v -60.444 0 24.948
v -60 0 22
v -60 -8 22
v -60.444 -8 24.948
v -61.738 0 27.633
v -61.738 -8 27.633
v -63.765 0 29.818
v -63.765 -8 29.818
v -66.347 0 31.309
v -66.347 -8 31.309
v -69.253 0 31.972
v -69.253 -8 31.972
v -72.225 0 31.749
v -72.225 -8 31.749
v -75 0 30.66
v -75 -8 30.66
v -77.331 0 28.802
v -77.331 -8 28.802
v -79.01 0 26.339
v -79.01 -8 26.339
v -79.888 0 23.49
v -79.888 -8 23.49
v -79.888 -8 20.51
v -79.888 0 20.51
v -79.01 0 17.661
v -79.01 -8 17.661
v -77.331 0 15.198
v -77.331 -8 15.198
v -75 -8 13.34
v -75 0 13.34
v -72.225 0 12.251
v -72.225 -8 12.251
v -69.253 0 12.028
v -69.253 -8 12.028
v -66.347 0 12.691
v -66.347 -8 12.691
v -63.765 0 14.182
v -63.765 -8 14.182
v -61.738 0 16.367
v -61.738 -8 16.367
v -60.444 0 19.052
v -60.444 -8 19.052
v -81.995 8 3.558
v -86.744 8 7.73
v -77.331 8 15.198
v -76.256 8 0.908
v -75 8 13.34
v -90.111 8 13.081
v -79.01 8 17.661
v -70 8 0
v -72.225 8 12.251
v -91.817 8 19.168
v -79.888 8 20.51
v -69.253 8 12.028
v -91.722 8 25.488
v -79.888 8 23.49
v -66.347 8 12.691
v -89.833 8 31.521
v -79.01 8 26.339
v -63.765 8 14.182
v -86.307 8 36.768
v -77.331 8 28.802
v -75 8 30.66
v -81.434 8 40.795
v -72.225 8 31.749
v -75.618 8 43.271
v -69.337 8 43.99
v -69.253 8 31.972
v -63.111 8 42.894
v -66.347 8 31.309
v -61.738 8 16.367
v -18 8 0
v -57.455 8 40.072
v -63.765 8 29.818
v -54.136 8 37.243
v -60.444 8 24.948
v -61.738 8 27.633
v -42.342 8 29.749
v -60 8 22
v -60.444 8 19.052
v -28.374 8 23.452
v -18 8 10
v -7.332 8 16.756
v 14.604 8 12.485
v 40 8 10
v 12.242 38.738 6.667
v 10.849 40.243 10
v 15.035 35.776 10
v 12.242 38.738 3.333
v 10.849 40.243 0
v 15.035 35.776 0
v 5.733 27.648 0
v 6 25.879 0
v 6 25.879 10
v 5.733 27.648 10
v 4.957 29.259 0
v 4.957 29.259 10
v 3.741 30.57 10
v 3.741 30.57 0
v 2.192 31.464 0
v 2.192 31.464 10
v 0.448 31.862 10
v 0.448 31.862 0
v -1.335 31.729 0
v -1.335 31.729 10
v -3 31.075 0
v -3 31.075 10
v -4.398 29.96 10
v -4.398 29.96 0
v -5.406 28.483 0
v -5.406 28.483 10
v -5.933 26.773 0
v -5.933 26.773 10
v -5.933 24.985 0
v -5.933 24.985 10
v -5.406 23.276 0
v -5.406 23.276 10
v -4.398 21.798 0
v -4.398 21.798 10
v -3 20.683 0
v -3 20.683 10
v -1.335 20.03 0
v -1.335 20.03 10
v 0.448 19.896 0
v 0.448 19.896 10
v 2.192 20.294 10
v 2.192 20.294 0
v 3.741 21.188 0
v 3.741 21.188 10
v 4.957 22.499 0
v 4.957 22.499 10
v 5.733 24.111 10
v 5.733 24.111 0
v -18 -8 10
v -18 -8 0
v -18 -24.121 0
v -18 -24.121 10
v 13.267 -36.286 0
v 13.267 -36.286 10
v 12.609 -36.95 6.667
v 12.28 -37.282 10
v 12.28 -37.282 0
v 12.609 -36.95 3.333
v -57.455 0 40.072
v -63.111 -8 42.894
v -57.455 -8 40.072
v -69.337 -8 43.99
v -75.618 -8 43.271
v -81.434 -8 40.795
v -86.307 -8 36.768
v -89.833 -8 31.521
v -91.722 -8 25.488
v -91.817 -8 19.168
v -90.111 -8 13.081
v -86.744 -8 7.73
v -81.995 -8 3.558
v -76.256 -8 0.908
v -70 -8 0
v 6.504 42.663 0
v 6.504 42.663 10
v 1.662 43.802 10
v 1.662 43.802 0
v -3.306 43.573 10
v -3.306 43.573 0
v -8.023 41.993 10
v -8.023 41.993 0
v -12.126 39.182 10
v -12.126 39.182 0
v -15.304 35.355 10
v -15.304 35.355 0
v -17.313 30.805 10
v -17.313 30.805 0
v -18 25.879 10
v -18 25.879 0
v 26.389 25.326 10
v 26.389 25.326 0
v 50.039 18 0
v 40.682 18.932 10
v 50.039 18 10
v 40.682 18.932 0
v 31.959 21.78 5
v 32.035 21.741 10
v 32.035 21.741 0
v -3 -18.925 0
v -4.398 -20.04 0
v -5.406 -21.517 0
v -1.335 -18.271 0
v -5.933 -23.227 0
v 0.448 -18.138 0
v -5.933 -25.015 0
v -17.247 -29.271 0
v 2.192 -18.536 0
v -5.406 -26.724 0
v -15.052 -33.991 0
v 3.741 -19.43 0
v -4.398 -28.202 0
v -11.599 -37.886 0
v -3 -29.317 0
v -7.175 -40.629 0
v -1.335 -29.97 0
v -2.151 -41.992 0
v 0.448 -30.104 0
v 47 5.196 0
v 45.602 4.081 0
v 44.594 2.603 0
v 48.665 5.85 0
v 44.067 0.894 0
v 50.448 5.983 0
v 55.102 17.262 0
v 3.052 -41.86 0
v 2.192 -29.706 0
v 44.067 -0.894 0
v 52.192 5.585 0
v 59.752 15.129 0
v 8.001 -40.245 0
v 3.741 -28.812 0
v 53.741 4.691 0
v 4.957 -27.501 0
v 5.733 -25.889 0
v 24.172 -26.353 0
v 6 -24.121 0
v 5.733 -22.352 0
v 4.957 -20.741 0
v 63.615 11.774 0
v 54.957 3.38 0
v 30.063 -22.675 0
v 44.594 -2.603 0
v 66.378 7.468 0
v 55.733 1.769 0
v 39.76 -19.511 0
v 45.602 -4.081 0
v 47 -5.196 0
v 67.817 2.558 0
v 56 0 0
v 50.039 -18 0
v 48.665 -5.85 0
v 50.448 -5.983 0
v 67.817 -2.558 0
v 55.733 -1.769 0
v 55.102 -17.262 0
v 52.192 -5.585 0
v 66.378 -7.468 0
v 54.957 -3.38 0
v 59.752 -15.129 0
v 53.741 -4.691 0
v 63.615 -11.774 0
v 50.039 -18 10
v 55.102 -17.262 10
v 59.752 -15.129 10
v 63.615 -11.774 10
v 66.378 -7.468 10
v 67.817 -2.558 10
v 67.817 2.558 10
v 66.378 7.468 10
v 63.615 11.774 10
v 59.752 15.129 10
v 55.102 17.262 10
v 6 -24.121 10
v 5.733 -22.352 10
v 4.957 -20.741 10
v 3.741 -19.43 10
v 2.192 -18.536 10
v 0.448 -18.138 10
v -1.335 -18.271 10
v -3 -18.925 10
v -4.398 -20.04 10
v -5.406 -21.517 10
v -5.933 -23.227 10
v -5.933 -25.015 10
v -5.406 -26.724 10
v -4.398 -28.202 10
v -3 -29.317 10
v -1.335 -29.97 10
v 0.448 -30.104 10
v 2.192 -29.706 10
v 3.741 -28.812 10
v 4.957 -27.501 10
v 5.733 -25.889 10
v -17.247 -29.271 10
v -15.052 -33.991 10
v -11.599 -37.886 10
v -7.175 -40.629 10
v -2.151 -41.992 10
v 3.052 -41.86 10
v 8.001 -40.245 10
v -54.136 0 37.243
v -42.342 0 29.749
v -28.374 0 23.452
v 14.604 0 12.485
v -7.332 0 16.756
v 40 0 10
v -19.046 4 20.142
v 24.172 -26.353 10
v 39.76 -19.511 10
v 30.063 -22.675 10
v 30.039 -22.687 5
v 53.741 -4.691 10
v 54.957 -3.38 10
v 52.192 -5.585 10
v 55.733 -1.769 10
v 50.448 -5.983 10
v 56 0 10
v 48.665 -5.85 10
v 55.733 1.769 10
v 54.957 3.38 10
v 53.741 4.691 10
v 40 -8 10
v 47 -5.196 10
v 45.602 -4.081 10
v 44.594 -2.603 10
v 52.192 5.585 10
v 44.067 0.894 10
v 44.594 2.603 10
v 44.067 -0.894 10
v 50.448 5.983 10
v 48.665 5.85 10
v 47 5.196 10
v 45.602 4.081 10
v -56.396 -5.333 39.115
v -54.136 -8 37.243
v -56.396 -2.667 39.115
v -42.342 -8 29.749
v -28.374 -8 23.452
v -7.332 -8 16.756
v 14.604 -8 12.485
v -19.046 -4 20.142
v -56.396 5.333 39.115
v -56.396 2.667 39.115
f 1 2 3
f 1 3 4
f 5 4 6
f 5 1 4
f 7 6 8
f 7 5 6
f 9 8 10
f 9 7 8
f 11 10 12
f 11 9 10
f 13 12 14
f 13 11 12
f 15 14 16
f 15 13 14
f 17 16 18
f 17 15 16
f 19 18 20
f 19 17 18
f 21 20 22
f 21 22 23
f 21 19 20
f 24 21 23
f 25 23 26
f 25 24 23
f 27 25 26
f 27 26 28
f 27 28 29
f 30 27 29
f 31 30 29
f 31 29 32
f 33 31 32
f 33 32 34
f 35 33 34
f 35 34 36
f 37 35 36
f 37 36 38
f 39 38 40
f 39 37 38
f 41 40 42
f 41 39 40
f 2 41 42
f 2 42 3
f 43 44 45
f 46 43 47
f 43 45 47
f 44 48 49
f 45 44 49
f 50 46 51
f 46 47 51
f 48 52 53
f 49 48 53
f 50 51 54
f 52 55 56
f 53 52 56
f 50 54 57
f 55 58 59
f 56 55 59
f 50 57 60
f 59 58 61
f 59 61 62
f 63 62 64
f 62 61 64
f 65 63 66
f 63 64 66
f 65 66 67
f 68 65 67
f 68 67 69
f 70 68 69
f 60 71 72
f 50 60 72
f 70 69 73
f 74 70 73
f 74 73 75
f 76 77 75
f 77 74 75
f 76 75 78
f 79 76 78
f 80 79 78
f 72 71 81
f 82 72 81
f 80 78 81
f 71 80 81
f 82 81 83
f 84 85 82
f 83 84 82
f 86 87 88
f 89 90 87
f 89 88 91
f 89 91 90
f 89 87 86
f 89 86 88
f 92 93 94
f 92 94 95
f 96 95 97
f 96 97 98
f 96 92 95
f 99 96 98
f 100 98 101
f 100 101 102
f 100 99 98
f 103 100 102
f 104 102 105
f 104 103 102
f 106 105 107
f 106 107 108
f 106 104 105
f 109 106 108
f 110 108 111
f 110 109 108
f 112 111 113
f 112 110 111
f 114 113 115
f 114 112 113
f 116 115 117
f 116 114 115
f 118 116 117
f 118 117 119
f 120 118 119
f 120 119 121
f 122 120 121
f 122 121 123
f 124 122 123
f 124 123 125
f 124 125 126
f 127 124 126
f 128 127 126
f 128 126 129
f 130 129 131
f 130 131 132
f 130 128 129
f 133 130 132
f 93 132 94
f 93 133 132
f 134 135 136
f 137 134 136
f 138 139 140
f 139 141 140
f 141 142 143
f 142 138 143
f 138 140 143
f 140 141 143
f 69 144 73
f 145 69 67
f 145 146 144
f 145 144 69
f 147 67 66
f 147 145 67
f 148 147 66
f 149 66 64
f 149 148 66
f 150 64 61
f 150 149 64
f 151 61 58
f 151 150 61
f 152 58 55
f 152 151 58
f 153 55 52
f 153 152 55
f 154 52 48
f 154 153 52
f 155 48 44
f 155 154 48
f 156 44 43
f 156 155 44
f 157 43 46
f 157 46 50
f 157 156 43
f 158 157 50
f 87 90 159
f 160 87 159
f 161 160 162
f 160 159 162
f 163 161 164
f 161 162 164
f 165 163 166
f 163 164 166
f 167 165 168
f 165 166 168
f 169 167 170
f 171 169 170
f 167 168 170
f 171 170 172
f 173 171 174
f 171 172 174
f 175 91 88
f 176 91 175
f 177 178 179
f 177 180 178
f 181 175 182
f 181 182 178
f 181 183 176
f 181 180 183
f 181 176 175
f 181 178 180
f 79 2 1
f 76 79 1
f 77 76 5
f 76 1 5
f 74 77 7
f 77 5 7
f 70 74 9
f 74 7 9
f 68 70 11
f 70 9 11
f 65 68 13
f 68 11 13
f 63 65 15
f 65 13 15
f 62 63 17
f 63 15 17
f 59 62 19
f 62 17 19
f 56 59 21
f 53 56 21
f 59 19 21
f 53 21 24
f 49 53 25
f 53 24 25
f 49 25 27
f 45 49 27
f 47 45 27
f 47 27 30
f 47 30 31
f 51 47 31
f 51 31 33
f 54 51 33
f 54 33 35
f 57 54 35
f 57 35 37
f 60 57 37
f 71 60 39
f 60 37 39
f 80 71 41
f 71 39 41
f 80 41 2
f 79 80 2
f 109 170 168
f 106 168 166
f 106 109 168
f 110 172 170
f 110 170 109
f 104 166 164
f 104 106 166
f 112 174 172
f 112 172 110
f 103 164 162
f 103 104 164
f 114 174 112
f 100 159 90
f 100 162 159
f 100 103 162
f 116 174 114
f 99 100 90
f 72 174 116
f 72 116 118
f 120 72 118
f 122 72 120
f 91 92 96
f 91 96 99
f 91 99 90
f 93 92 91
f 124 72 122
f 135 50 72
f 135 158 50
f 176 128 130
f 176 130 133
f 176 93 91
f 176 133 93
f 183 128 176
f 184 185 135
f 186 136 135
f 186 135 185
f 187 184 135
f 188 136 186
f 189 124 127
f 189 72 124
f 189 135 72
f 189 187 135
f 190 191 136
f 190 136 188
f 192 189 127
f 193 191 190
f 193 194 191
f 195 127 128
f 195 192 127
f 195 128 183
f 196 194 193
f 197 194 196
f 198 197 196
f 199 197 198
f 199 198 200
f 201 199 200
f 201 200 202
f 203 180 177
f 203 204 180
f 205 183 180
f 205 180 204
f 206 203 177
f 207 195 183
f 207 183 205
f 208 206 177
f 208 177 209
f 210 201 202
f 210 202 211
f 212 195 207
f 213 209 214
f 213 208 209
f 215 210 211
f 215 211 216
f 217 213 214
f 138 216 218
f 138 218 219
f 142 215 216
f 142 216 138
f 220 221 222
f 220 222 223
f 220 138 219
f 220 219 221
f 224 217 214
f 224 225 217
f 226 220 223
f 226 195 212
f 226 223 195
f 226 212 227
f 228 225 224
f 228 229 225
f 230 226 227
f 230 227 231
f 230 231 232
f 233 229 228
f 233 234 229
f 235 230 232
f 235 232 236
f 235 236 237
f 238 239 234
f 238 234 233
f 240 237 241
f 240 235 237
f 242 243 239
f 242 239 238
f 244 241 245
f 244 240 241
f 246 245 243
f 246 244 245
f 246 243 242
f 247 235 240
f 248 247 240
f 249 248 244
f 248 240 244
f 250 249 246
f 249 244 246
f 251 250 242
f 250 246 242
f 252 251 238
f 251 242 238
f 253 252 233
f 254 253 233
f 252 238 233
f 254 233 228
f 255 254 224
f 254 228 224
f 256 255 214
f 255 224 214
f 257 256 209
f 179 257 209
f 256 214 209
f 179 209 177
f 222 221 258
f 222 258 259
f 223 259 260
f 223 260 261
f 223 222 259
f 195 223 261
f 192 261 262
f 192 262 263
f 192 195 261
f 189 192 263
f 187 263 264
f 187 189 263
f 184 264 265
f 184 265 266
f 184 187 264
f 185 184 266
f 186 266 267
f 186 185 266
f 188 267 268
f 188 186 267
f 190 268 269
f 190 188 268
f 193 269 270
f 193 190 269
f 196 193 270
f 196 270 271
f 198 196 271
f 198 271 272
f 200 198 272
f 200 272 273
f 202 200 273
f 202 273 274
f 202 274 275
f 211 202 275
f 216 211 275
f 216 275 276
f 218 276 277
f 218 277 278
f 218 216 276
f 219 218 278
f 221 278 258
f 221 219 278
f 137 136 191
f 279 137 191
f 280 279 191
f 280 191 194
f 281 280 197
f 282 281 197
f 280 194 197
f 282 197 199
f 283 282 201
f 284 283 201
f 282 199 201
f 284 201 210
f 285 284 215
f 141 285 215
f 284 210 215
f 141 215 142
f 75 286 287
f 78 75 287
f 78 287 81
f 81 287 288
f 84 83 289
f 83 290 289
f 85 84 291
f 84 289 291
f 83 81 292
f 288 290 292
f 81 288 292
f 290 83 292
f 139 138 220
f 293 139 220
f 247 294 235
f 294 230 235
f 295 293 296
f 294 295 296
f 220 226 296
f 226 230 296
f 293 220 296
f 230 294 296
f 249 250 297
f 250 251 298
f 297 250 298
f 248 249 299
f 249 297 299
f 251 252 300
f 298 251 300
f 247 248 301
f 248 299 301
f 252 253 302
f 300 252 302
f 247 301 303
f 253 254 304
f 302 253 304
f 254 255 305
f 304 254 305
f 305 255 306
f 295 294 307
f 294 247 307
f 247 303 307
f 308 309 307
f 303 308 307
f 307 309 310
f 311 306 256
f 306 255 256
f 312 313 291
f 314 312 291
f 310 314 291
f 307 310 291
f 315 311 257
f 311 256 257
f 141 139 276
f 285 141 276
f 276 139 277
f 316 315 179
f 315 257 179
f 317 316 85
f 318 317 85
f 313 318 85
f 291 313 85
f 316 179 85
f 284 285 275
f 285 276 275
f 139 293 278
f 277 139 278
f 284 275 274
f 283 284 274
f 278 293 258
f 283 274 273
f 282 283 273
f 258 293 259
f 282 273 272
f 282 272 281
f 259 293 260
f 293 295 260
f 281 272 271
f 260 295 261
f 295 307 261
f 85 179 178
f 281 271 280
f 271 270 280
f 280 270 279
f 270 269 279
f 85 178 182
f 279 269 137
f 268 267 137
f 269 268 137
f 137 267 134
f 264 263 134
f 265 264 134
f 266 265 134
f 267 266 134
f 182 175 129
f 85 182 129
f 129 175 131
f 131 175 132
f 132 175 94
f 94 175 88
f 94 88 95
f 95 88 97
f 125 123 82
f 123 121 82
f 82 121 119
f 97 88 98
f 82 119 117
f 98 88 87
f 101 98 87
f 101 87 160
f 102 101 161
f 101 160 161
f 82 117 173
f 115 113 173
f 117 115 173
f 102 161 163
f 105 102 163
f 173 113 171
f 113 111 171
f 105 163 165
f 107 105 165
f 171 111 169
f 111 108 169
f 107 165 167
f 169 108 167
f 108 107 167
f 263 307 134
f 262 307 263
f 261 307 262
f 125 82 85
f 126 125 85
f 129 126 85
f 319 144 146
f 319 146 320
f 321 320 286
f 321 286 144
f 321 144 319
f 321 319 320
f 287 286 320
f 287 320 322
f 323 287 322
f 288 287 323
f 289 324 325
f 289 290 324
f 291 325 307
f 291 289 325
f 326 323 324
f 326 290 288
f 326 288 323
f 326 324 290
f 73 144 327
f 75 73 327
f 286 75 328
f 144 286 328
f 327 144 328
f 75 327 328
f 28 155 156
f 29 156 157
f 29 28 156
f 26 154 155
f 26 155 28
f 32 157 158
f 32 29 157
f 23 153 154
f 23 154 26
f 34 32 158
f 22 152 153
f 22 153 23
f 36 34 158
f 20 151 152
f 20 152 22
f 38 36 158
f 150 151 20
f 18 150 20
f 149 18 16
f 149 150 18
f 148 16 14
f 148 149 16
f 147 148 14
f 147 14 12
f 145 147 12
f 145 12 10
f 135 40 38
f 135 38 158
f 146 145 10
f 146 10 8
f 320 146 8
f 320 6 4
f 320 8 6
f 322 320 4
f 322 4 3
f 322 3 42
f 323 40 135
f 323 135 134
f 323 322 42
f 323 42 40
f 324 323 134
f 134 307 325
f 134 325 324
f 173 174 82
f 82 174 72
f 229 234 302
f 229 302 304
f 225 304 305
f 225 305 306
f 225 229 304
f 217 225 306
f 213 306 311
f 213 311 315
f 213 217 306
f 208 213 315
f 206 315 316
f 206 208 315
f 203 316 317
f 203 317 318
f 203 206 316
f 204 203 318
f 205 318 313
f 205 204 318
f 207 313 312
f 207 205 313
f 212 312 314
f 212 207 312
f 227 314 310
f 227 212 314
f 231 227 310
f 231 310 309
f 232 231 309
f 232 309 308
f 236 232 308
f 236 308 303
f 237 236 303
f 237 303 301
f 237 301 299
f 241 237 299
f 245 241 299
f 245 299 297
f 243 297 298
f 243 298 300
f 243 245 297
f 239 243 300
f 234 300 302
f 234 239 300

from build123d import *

# Parameters (mm, degrees)
F0_R          = 6
F1_DEPTH      = 10
F2_R          = 10
F3_DEPTH      = 8
F3_DEPTH_BACK = 8


with BuildPart() as f1:
    # F0 (on Top) → F1 (new body)
    with BuildSketch(Plane.XY):
        with BuildLine():
            add(Edge.make_bspline(
                [(15.035214282, 35.7758070535), (20.6547243447, 29.9096895942), (32.0572190076, 19.3354156229), (43.3709472389, 18.3830413599), (50.0389123718, 17.9999579396)],
                knots=[0.1100015048, 0.1100015048, 0.1100015048, 0.1100015048, 0.5520103315, 1, 1, 1, 1], degree=3))
            add(Edge.make_bspline(
                [(10.8487541415, 40.2425303512), (12.240880162, 38.7336352898), (13.6367024745, 37.2356913565), (15.035214282, 35.7758070535)],
                knots=[0, 0, 0, 0, 0.1100015048, 0.1100015048, 0.1100015048, 0.1100015048], degree=3))
            ThreePointArc((10.8487541415, 40.2425303512), (-8.0225440308, 41.9925361174), (-18, 25.8792252449))
            Line((-18, 25.8792252449), (-18, -24.1207747551))
            ThreePointArc((-18, -24.1207747551), (-7.1750439774, -40.6289165015), (12.2798604358, -37.281512868))
            add(Edge.make_bspline(
                [(12.2798604358, -37.281512868), (12.6087941785, -36.9495490353), (12.9376997677, -36.6175538258), (13.266753224, -36.2860227548)],
                knots=[0, 0, 0, 0, 0.030015942, 0.030015942, 0.030015942, 0.030015942], degree=3))
            add(Edge.make_bspline(
                [(13.266753224, -36.2860227548), (18.573084972, -30.9397368732), (29.2837115537, -20.4679750546), (43.1130211826, -18.8256033287), (50.0389123718, -17.9999579396)],
                knots=[0.030015942, 0.030015942, 0.030015942, 0.030015942, 0.5140544551, 1, 1, 1, 1], degree=3))
            ThreePointArc((50.0389123718, -17.9999579396), (68, 0), (50.0389123718, 17.9999579396))
        make_face()
        with Locations((0, -24.1207747551)):
            Circle(F0_R, mode=Mode.SUBTRACT)
        with Locations((50, 0)):
            Circle(F0_R, mode=Mode.SUBTRACT)
        with Locations((0, 25.8792252449)):
            Circle(F0_R, mode=Mode.SUBTRACT)
    extrude(amount=F1_DEPTH)

    # F2 (on Front) → F3 (join, two sides)
    with BuildSketch(Plane.XZ) as f3_sk:
        with BuildLine():
            Line((-70, 0), (40, 0))
            Line((40, 0), (40, 10))
            add(Edge.make_bspline(
                [(-54.1361760858, 37.2426733488), (-45.1191100189, 30.1758346752), (-14.9531909541, 16.7242072459), (16.1924294121, 11.4815951801), (40, 10)],
                knots=[0.0529916149, 0.0529916149, 0.0529916149, 0.0529916149, 0.4594202582, 1, 1, 1, 1], degree=3))
            add(Edge.make_bspline(
                [(-57.4545068819, 40.0723712452), (-56.4207333208, 39.1074668132), (-55.3118532927, 38.1640729584), (-54.1361760858, 37.2426733488)],
                knots=[0, 0, 0, 0, 0.0529916149, 0.0529916149, 0.0529916149, 0.0529916149], degree=3))
            ThreePointArc((-57.4545068819, 40.0723712452), (-90.9951442886, 28.5729686066), (-70, 0))
        make_face()
        with Locations((-70, 22)):
            Circle(F2_R, mode=Mode.SUBTRACT)
    extrude(amount=F3_DEPTH)
    extrude(f3_sk.sketch, amount=-F3_DEPTH_BACK)


solid = f1.part
